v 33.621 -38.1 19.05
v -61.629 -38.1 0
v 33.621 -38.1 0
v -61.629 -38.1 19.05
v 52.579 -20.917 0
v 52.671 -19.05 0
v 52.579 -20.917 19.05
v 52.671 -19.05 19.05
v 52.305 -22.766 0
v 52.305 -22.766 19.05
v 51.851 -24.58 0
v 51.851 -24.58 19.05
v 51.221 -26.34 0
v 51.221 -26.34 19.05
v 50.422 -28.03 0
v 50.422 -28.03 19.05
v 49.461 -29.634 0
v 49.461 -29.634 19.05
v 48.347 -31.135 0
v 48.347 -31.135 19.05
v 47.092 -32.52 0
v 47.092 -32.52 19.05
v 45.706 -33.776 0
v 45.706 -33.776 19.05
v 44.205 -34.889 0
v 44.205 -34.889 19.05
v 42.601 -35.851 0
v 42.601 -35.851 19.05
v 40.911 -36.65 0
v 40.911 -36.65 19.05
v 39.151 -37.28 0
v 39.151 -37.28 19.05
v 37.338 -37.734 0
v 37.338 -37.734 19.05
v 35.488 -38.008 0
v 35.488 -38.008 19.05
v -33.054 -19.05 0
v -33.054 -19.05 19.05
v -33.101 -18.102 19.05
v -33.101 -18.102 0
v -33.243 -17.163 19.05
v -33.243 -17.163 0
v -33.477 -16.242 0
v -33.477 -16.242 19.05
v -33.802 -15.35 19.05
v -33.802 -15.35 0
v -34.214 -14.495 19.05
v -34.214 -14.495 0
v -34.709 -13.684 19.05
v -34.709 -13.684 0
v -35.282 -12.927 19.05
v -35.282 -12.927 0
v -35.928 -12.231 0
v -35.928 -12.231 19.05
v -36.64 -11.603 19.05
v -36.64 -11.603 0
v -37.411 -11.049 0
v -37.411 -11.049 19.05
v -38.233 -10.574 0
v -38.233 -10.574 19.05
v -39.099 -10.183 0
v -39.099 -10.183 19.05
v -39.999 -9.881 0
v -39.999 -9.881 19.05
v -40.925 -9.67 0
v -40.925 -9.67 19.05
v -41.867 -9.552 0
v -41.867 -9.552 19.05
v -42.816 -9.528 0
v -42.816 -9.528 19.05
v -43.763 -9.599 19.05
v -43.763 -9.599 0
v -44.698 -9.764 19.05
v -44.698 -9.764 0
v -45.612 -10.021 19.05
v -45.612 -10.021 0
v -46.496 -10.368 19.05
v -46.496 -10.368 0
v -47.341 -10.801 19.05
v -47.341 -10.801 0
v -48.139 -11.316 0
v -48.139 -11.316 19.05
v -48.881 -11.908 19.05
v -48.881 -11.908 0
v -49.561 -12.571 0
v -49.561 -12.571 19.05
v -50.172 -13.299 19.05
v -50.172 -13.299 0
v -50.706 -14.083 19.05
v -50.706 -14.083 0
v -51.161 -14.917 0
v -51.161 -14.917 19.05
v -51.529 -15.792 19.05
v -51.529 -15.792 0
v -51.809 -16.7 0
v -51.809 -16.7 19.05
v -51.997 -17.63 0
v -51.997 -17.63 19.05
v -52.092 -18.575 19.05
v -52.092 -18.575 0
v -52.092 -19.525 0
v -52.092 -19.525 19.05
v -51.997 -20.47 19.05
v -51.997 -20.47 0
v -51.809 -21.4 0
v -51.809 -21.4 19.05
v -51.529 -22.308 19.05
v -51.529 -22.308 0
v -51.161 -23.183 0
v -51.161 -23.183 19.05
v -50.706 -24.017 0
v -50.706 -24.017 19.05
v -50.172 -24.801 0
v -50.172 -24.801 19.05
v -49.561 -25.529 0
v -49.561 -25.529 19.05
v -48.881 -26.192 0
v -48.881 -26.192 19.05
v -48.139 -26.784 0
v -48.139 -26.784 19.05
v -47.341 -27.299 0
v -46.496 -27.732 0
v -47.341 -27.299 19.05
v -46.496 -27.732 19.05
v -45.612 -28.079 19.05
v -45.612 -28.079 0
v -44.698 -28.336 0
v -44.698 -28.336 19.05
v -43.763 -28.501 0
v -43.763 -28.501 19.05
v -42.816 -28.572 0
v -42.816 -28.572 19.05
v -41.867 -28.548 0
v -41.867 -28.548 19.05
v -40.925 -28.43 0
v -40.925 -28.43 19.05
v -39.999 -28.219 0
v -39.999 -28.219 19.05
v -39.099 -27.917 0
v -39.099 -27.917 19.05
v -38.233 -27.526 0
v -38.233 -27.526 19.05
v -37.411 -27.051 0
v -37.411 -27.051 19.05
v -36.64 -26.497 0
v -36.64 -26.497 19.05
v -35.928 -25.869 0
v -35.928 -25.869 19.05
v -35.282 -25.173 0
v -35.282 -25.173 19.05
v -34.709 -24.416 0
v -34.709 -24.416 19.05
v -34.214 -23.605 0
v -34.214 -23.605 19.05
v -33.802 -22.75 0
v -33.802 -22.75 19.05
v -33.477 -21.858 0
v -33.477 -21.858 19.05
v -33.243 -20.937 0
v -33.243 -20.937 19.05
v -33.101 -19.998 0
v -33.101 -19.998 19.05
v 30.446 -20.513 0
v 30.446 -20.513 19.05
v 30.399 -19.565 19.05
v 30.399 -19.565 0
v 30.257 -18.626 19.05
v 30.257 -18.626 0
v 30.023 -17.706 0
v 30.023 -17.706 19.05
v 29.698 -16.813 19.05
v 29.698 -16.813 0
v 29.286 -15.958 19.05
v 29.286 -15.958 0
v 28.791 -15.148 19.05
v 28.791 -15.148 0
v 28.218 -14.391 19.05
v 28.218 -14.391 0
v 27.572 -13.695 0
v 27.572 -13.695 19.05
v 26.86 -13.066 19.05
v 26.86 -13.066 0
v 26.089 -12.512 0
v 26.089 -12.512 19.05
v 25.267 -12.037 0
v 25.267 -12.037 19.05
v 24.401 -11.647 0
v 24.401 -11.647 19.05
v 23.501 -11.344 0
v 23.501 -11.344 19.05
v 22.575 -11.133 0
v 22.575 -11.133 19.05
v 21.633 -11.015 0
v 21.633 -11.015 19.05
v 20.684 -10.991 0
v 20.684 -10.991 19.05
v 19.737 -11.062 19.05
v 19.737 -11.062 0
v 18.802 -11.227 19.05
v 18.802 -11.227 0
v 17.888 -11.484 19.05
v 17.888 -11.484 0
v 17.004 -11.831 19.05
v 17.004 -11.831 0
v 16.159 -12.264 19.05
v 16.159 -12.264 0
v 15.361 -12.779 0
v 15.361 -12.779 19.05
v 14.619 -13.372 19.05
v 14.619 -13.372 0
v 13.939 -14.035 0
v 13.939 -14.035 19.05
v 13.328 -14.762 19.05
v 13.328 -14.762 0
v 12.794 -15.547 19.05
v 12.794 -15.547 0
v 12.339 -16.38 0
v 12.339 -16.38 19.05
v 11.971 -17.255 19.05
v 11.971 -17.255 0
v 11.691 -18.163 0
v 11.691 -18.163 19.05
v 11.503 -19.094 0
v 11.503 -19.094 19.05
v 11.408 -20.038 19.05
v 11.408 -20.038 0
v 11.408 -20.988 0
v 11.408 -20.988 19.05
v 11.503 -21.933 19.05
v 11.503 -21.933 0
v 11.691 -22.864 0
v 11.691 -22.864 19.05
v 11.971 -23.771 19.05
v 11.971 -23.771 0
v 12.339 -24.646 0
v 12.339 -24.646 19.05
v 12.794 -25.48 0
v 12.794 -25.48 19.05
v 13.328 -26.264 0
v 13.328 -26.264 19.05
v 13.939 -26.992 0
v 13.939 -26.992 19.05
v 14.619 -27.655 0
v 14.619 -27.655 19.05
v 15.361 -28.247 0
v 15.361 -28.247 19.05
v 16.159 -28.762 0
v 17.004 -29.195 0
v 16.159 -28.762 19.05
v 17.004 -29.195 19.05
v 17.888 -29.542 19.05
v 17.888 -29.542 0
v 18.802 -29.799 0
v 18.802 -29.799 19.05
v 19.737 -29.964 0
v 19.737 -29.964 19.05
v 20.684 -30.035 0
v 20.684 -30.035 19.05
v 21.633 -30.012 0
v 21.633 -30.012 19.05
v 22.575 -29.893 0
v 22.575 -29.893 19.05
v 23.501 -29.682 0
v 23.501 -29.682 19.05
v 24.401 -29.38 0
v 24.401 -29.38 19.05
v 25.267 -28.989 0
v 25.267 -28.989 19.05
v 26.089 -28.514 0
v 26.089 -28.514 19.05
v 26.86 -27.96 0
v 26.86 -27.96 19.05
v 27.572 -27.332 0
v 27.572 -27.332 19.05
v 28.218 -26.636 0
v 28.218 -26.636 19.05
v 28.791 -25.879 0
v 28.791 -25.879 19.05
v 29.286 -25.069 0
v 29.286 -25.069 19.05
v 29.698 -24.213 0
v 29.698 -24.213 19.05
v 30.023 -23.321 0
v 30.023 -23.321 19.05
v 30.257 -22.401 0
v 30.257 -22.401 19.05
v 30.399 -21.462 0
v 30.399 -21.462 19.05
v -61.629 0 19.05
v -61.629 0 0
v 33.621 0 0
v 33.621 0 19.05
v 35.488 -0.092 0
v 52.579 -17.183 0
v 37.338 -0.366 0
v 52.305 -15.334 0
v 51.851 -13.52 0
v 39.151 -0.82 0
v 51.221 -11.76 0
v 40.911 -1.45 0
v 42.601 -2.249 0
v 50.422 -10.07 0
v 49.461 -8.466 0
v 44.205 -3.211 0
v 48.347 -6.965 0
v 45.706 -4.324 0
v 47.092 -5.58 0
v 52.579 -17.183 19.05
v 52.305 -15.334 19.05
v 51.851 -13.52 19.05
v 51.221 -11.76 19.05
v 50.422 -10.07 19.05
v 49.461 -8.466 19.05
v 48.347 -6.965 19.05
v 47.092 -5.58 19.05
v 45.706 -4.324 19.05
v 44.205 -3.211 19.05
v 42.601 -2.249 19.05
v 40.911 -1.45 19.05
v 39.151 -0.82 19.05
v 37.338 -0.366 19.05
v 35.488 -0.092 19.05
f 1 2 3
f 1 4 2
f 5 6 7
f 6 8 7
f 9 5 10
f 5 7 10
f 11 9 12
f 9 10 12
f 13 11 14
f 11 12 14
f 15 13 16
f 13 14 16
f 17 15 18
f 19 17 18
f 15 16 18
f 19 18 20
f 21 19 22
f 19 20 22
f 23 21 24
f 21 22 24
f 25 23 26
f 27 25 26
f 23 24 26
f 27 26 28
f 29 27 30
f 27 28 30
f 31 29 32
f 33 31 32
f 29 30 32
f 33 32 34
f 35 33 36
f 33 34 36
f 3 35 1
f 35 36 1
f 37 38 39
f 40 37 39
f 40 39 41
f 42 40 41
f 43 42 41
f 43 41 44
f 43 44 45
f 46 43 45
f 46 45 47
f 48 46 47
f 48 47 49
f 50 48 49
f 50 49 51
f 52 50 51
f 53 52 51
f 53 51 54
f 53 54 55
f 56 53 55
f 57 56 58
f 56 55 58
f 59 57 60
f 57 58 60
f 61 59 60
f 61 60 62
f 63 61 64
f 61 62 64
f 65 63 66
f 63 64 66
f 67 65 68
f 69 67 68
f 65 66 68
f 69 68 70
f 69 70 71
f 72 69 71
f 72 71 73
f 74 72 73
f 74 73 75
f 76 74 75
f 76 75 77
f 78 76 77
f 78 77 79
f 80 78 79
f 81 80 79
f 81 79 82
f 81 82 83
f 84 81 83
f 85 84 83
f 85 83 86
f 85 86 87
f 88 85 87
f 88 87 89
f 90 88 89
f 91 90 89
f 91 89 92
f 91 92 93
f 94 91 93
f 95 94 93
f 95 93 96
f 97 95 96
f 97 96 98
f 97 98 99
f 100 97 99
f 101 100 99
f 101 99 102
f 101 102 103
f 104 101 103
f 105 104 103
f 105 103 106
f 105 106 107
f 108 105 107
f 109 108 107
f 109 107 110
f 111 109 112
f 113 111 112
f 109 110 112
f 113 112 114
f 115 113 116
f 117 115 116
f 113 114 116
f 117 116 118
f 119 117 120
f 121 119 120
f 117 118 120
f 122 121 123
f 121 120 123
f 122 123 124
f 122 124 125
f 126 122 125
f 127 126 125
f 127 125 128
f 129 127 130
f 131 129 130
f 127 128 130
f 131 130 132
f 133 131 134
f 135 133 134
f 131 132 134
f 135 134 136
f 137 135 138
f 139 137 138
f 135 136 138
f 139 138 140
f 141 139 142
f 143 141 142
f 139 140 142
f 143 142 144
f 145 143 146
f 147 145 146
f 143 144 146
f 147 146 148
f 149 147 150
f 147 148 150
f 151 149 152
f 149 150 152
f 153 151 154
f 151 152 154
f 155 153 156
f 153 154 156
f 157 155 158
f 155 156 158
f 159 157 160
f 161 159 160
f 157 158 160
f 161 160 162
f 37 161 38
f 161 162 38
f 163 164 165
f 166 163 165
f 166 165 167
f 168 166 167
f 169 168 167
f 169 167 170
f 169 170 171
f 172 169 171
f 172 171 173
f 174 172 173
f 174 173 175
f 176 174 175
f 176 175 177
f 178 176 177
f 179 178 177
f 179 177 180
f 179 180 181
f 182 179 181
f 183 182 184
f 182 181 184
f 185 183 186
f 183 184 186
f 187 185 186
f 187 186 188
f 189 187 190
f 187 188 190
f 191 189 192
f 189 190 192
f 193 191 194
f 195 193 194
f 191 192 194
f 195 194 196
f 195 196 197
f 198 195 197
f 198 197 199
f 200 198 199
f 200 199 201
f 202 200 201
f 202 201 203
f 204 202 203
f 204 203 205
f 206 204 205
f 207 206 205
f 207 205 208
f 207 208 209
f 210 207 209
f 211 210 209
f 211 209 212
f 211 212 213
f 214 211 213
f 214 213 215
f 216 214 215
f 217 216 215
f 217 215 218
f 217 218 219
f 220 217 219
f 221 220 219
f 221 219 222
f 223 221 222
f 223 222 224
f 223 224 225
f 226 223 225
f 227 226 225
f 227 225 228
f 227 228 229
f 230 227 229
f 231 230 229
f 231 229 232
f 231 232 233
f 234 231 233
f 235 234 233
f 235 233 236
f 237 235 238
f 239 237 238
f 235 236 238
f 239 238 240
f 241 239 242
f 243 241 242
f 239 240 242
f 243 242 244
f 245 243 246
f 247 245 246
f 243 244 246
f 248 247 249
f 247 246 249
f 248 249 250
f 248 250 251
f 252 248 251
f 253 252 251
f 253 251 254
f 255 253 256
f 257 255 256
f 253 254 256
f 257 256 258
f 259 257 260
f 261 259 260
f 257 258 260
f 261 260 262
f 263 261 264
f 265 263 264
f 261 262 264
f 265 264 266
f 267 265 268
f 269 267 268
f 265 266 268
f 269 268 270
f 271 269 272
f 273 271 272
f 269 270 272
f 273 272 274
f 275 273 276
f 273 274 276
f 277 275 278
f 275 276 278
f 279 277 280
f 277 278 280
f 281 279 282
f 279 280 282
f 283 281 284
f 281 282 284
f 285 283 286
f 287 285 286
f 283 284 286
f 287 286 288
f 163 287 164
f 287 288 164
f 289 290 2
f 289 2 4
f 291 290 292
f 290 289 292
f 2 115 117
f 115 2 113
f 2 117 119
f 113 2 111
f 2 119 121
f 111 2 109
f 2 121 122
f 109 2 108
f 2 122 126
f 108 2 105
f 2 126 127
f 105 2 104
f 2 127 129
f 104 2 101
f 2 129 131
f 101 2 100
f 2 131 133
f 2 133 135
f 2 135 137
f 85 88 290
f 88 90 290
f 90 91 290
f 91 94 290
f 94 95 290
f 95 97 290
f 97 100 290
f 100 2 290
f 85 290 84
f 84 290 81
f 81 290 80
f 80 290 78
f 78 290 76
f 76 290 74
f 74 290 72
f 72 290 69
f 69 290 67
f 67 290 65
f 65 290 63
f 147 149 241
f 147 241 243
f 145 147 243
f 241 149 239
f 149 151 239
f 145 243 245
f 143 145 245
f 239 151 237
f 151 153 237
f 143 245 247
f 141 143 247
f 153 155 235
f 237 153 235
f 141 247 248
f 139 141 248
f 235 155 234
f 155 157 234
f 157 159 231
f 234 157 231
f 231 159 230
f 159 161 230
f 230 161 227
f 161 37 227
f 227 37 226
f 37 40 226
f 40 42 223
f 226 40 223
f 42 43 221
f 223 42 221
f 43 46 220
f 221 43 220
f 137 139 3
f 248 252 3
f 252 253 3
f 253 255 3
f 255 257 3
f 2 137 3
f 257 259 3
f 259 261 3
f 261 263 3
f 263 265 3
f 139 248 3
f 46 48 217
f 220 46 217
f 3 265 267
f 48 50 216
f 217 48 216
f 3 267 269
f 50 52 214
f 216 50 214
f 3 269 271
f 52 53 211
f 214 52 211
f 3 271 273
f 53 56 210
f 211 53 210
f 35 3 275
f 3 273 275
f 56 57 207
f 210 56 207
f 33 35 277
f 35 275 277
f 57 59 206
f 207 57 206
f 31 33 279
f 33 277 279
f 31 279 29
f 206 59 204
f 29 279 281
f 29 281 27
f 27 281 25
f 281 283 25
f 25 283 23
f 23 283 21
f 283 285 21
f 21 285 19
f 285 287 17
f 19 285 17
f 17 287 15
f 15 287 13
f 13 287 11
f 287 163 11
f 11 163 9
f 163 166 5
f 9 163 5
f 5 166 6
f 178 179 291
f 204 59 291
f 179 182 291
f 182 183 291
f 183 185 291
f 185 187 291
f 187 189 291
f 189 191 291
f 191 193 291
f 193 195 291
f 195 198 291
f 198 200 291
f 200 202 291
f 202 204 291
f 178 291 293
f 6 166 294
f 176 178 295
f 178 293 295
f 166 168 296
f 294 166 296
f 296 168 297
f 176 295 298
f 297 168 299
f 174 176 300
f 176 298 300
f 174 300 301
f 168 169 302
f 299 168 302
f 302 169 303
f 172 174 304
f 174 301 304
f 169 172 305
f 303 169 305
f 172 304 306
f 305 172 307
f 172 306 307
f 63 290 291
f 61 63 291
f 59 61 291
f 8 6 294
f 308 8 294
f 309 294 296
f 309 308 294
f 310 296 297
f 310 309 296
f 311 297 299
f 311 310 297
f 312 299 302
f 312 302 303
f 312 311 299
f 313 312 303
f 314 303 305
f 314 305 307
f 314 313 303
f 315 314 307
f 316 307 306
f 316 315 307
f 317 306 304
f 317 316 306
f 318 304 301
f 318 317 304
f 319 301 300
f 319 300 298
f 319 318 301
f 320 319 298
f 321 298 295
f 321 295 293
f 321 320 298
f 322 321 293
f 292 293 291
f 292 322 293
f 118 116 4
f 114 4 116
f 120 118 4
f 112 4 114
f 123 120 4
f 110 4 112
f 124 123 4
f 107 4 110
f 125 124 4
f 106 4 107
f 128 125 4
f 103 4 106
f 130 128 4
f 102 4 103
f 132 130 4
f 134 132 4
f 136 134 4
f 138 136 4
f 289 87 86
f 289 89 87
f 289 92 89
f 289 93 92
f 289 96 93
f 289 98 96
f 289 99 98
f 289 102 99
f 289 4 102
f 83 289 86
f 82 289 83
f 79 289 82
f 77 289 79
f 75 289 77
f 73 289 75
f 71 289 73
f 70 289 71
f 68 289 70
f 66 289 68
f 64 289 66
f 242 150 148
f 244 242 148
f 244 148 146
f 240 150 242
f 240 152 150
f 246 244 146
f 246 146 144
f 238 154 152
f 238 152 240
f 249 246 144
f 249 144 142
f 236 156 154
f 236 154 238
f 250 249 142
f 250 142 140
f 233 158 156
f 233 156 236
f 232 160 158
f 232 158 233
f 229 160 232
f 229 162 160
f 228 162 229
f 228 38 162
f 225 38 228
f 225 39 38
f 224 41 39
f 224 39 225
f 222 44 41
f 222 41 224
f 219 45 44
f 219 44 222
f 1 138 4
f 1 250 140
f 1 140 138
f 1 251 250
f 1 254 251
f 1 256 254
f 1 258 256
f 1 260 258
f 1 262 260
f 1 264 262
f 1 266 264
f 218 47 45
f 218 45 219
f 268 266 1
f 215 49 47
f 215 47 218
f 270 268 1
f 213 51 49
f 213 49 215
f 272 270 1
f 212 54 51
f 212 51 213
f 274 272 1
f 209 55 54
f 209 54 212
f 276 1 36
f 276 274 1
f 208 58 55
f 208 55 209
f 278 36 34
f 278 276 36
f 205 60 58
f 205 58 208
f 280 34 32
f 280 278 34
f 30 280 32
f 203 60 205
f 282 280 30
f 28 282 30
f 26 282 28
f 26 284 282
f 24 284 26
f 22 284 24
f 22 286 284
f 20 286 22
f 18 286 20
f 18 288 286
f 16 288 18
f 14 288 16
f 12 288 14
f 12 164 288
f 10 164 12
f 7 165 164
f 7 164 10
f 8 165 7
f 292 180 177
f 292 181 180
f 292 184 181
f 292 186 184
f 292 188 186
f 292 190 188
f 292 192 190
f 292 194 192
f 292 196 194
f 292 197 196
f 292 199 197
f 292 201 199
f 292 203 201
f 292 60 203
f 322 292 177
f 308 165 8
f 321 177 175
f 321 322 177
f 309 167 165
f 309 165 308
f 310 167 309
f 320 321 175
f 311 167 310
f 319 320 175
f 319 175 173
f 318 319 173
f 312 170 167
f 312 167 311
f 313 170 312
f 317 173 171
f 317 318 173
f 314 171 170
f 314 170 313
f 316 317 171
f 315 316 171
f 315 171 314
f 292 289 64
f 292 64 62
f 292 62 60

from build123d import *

# Parameters (mm, degrees)
F0_W     = 114.3
F0_H     = 19.05
F1_DEPTH = 38.1
F2_R     = 19.04999
F3_R     = 9.525
F4_DEPTH = 38.1


# Not quite as in the source:
# - a fillet or chamfer is up to 0.001 mm smaller than in the source, because OpenCascade refuses the exact size


with BuildPart() as f1:
    # F0 (on Front) → F1 (new body)
    with BuildSketch(Plane.XZ):
        with Locations((-4.4788396761, 9.525)):
            Rectangle(F0_W, F0_H)
    extrude(amount=F1_DEPTH)

    # F2 (radius 19.05 in the source; OpenCascade refuses exactly that, so slightly less here)
    f2_edges = [f1.edges().sort_by_distance(p)[0] for p in [
        (52.67116, -38.1, 9.525),
        (52.67116, 0, 9.525),
    ]]
    fillet(f2_edges, radius=F2_R)

    # F3 (on face) → F4 (cut)
    with BuildSketch(Plane.XY.offset(19.05)):
        with Locations((-42.5788396761, -19.05)):
            Circle(F3_R)
        with Locations((20.9211603239, -20.5131974071)):
            Circle(F3_R)
    extrude(amount=-F4_DEPTH, mode=Mode.SUBTRACT)


solid = f1.part
